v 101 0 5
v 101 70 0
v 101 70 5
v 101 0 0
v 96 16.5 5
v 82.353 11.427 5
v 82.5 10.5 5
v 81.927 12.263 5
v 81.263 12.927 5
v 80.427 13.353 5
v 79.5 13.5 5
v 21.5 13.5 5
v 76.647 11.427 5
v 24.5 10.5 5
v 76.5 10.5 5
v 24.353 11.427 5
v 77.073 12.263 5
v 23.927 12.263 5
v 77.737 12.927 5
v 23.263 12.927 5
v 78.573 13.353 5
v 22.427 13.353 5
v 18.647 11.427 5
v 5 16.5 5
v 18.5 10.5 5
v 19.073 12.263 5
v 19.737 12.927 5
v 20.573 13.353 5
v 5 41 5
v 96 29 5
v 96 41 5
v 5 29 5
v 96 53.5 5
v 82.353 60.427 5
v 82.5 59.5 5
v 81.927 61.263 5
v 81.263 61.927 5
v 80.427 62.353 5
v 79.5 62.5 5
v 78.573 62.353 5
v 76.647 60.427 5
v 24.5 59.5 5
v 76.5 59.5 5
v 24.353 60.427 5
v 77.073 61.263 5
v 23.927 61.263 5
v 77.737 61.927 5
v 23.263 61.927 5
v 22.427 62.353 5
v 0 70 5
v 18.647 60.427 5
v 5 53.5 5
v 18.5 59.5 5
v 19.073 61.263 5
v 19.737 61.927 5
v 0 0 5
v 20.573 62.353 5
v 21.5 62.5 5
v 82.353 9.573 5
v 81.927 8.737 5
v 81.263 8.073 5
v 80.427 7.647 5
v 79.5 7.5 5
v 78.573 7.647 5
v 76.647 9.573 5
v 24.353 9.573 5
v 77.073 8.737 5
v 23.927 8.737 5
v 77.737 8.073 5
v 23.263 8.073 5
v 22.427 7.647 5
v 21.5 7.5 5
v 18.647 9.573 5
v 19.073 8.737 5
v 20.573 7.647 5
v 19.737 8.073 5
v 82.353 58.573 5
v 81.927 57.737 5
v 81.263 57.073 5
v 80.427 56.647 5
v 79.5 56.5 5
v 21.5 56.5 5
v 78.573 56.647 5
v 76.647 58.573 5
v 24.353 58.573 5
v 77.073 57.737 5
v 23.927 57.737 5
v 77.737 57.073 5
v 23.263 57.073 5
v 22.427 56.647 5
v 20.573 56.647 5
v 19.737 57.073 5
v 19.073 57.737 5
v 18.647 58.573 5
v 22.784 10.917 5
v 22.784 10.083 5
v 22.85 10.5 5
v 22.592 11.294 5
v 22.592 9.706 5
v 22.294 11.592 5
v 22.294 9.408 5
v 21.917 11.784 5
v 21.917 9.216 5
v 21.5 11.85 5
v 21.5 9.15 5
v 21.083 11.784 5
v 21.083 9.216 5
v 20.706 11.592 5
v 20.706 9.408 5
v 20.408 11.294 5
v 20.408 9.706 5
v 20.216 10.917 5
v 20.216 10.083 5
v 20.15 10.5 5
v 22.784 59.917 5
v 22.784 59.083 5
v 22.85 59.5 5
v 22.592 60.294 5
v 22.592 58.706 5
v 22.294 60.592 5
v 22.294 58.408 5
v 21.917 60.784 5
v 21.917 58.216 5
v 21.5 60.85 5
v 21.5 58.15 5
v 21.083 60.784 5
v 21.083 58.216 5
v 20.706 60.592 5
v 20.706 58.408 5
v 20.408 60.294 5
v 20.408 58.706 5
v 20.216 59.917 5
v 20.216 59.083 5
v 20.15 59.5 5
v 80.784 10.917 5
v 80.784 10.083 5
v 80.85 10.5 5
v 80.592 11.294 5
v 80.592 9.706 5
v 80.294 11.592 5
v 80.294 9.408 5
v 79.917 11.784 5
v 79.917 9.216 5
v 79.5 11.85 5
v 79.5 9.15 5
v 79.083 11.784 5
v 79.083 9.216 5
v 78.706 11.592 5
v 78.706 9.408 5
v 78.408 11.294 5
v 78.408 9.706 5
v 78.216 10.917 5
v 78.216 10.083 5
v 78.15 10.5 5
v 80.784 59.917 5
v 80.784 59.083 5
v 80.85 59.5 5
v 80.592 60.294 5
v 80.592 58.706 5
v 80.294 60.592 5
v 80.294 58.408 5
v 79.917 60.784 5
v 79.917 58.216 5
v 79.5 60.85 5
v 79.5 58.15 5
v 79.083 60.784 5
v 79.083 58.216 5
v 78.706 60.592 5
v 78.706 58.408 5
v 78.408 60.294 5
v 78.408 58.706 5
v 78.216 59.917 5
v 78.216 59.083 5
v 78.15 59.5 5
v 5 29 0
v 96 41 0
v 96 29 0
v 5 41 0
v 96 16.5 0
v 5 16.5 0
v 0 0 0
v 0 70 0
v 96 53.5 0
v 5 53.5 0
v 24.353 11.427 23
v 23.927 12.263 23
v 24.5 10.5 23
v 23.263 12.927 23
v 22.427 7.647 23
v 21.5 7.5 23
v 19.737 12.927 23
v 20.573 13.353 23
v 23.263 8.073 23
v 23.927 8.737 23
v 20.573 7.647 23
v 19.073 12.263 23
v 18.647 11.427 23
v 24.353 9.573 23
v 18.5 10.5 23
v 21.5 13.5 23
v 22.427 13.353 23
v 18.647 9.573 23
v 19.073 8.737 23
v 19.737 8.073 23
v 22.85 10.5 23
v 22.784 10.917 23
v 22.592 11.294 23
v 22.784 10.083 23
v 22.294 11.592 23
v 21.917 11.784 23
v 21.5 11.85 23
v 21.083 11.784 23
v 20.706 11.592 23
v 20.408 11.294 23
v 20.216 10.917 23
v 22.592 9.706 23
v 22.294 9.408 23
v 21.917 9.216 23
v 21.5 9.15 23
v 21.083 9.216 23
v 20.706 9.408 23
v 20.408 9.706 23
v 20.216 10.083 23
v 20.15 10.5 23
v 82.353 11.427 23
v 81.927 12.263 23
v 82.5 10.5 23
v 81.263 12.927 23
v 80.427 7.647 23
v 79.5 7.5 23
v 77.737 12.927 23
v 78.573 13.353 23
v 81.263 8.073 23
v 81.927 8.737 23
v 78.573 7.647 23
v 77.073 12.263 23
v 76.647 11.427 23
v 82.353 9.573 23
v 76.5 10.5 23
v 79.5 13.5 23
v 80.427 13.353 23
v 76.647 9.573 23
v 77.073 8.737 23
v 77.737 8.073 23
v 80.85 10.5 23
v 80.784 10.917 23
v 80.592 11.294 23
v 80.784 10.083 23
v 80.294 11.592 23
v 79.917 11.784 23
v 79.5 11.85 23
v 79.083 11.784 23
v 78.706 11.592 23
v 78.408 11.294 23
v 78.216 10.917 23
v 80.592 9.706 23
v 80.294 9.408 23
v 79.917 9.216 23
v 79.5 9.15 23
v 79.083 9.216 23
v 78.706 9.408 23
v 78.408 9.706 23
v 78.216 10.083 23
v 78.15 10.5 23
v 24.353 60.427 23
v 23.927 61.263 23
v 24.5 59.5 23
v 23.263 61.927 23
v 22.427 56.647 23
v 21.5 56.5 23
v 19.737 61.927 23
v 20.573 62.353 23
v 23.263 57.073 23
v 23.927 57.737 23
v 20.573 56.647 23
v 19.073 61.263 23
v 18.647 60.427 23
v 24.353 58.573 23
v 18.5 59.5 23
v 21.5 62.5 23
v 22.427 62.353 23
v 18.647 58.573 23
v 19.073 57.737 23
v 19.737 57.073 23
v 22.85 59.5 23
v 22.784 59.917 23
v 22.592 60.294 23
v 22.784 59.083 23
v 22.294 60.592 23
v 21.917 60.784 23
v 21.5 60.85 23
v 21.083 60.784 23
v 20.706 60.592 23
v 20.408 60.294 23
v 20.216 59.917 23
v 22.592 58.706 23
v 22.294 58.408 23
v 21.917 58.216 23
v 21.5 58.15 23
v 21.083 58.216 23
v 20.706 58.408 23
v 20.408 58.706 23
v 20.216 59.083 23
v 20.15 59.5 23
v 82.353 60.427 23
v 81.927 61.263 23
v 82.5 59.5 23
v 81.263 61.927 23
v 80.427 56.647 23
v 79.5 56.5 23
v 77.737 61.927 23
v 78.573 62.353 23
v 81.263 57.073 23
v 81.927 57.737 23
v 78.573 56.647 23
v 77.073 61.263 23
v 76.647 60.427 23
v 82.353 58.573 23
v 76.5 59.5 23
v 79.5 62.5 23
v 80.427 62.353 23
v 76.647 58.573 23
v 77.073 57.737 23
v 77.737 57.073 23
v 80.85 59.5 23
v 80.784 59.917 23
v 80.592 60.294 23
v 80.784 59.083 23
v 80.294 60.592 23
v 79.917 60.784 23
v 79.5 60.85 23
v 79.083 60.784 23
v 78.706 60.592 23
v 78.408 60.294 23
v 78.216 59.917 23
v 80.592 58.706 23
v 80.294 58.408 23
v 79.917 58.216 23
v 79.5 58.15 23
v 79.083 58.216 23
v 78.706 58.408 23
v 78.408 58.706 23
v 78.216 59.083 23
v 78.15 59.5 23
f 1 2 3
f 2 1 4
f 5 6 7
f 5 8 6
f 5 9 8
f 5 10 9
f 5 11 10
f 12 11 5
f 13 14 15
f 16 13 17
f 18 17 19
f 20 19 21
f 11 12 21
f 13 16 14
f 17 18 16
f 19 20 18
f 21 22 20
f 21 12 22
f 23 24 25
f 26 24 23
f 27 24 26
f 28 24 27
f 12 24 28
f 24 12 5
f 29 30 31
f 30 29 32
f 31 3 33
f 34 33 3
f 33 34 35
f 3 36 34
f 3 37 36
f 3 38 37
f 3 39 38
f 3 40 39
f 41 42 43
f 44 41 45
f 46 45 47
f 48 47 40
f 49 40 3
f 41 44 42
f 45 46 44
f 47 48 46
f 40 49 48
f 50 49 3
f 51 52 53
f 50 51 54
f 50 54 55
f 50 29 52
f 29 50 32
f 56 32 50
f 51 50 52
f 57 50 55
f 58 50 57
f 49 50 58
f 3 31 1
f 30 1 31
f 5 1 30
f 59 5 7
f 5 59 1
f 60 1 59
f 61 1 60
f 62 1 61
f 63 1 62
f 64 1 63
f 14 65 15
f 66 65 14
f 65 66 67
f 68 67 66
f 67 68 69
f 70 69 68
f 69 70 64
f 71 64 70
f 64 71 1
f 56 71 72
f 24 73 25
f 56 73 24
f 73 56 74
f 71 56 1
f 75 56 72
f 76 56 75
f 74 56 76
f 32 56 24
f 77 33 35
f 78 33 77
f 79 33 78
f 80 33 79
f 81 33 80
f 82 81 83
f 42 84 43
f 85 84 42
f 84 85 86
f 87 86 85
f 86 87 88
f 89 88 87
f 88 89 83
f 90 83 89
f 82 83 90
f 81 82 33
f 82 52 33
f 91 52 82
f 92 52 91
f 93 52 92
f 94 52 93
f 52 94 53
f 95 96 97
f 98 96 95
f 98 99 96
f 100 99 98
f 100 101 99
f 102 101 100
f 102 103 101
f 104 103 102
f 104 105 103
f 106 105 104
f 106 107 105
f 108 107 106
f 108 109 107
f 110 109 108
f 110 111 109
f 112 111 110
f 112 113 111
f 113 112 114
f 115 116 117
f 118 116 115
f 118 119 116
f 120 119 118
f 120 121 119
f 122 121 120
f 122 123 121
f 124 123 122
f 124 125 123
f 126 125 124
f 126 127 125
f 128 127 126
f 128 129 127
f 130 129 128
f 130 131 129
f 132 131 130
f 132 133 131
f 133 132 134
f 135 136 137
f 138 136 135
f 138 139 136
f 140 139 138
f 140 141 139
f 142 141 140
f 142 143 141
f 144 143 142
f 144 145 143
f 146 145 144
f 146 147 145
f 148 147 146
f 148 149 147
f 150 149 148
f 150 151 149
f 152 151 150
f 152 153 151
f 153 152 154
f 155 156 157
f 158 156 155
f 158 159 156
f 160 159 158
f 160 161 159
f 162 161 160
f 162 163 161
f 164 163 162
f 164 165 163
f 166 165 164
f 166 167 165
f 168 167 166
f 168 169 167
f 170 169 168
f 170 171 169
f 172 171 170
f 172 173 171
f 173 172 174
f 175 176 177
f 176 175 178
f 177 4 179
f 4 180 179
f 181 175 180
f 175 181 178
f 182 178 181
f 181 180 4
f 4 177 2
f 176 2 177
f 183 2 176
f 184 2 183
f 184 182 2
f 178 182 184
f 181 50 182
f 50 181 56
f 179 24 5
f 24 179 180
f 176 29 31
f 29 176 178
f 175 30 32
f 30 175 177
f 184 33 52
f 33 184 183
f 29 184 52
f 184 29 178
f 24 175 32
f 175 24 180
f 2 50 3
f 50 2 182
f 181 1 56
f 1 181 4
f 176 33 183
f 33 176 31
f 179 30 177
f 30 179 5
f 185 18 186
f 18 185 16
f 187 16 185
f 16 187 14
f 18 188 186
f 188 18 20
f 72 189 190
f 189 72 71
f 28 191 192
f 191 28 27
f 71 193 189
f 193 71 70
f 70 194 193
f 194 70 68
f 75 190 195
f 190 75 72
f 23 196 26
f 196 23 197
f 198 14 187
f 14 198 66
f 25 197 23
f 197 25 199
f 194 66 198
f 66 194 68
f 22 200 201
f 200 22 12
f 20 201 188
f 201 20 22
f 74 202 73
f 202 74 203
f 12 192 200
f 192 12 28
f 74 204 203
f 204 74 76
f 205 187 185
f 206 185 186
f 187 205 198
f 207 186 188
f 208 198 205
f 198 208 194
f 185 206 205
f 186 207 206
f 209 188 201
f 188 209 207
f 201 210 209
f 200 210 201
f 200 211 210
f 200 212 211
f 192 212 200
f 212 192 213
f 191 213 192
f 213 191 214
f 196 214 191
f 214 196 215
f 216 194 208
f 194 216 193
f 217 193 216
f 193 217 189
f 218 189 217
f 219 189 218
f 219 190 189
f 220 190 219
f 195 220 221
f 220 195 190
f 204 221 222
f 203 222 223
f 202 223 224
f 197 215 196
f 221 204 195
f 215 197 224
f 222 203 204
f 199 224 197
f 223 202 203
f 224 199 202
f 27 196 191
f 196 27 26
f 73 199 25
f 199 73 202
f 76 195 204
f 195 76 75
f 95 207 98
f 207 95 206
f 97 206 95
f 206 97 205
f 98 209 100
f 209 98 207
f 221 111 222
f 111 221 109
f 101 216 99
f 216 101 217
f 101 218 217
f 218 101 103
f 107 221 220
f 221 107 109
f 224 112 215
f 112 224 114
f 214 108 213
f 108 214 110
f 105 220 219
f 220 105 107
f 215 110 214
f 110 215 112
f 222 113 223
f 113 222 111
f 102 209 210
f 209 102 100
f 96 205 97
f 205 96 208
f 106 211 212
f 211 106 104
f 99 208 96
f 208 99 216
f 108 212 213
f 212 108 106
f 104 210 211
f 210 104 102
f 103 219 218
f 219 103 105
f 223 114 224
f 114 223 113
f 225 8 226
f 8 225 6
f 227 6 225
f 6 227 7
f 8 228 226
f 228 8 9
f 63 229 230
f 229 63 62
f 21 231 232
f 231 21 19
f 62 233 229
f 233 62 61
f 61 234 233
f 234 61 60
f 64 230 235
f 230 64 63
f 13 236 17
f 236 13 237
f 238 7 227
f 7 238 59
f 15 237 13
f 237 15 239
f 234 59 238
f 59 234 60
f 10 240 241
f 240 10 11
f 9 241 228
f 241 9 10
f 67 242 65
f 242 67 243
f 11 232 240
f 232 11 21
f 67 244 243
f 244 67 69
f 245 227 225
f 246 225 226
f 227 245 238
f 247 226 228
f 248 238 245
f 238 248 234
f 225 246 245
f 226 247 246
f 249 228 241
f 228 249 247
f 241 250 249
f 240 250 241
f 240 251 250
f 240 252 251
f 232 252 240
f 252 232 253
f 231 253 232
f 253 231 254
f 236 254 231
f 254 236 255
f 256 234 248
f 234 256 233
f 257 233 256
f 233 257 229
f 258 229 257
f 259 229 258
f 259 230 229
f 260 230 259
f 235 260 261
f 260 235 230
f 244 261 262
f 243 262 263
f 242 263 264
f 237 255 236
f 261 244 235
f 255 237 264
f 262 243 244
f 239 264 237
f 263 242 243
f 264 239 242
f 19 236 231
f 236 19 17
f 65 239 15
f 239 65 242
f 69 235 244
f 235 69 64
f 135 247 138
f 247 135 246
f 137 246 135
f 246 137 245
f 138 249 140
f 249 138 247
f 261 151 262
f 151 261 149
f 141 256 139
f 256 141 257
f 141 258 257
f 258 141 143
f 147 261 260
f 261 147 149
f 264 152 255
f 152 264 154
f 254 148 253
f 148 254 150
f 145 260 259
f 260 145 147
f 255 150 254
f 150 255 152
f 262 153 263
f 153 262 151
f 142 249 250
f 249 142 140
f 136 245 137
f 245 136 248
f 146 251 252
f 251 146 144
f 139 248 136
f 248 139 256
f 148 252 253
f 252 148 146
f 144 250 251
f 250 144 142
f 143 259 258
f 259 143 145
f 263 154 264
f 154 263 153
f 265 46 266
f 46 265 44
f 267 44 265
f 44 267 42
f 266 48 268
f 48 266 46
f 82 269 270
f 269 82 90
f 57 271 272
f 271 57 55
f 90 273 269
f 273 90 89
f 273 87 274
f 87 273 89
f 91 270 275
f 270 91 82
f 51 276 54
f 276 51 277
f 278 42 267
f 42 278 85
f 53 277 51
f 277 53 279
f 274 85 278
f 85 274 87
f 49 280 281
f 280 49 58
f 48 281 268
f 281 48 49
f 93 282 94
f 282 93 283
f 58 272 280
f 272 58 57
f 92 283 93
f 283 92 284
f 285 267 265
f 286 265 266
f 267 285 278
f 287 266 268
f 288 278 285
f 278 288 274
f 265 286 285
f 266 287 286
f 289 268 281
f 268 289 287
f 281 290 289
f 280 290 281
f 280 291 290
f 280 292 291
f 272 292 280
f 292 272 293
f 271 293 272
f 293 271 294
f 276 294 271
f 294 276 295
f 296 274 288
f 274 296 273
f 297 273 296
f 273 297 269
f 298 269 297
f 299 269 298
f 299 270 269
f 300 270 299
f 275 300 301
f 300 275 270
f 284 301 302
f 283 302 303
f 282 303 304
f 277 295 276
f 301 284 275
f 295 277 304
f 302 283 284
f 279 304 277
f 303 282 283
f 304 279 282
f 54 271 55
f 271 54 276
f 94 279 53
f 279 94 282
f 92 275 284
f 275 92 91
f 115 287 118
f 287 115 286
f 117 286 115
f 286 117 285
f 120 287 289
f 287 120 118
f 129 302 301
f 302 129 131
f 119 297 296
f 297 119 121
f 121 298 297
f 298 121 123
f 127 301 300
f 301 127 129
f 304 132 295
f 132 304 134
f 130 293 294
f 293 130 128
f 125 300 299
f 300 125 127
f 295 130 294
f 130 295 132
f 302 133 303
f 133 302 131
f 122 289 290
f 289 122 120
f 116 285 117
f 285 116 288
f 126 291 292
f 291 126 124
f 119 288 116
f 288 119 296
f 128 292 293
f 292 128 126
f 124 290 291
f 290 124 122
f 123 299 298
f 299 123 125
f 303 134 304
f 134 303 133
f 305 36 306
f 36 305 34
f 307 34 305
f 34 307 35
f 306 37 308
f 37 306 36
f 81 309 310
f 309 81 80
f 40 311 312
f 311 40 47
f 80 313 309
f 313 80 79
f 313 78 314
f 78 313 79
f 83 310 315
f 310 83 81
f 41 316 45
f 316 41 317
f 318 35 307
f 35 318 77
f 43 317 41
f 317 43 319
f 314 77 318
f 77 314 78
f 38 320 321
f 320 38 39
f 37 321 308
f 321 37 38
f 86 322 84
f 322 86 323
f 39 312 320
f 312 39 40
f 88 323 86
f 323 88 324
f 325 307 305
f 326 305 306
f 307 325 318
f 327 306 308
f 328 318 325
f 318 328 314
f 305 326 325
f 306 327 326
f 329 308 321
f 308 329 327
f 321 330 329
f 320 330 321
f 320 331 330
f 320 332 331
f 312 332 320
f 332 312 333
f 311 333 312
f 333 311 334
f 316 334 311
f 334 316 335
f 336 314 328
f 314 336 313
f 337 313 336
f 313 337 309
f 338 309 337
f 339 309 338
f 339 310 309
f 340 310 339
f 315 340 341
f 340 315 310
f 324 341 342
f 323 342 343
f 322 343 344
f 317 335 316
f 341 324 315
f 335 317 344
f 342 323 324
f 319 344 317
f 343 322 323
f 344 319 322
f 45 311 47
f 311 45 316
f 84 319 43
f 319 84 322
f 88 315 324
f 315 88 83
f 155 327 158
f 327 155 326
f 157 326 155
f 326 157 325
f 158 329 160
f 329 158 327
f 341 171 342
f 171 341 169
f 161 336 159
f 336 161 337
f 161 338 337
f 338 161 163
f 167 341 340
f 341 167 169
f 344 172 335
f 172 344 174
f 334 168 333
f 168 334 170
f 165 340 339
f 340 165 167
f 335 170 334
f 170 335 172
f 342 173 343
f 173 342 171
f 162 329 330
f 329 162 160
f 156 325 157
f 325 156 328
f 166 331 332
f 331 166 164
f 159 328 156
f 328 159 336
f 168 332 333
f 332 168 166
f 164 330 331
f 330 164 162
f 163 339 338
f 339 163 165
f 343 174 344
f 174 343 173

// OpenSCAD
// Neato XV Signature Pro - Right Pod BASE ONLY
// Print this first to verify standoff alignment and velcro fit.
// If base fits, print right_pod_sides.scad separately.
//
// ORIENTATION: print this face down (ribbed bottom on bed), no supports needed.

// ============================================================
// PARAMETERS (must match right_pod_sides.scad)
// ============================================================

pod_width  = 101;
pod_depth  = 70;

rail_w = 5;
rib_w  = 12;

standoff_h    = 18;
standoff_od   = 6;
standoff_hole = 2.7; // M2.5

pi_hole_x_span = 58;
pi_hole_y_span = 49;

pi_x_left  = (pod_width - pi_hole_x_span) / 2;  // 21.5mm
pi_x_right = pi_x_left + pi_hole_x_span;         // 79.5mm

pi_y_front = (pod_depth - pi_hole_y_span) / 2;   // 10.5mm
pi_y_rear  = pi_y_front + pi_hole_y_span;         // 59.5mm
pi_y_mid   = (pi_y_front + pi_y_rear) / 2;        // 35mm

rib_positions = [pi_y_front, pi_y_mid, pi_y_rear];

pi_holes = [
    [pi_x_left,  pi_y_front],
    [pi_x_right, pi_y_front],
    [pi_x_left,  pi_y_rear ],
    [pi_x_right, pi_y_rear ],
];

// ============================================================
// MODULES
// ============================================================

module ribbed_bottom() {
    // Perimeter rails
    cube([rail_w, pod_depth, rail_w]);
    translate([pod_width - rail_w, 0, 0])
        cube([rail_w, pod_depth, rail_w]);
    cube([pod_width, rail_w, rail_w]);
    translate([0, pod_depth - rail_w, 0])
        cube([pod_width, rail_w, rail_w]);

    // Ribs centered on standoff Y positions
    for (y_center = rib_positions) {
        translate([0, y_center - rib_w / 2, 0])
            cube([pod_width, rib_w, rail_w]);
    }
}

module standoff(h, hole_d) {
    difference() {
        cylinder(h=h, d=standoff_od, $fn=20);
        cylinder(h=h + 0.1, d=hole_d, $fn=20);
    }
}

// ============================================================
// MAIN
// ============================================================

union() {
    ribbed_bottom();

    for (h = pi_holes) {
        translate([h[0], h[1], rail_w])
            standoff(standoff_h, standoff_hole);
    }
}
